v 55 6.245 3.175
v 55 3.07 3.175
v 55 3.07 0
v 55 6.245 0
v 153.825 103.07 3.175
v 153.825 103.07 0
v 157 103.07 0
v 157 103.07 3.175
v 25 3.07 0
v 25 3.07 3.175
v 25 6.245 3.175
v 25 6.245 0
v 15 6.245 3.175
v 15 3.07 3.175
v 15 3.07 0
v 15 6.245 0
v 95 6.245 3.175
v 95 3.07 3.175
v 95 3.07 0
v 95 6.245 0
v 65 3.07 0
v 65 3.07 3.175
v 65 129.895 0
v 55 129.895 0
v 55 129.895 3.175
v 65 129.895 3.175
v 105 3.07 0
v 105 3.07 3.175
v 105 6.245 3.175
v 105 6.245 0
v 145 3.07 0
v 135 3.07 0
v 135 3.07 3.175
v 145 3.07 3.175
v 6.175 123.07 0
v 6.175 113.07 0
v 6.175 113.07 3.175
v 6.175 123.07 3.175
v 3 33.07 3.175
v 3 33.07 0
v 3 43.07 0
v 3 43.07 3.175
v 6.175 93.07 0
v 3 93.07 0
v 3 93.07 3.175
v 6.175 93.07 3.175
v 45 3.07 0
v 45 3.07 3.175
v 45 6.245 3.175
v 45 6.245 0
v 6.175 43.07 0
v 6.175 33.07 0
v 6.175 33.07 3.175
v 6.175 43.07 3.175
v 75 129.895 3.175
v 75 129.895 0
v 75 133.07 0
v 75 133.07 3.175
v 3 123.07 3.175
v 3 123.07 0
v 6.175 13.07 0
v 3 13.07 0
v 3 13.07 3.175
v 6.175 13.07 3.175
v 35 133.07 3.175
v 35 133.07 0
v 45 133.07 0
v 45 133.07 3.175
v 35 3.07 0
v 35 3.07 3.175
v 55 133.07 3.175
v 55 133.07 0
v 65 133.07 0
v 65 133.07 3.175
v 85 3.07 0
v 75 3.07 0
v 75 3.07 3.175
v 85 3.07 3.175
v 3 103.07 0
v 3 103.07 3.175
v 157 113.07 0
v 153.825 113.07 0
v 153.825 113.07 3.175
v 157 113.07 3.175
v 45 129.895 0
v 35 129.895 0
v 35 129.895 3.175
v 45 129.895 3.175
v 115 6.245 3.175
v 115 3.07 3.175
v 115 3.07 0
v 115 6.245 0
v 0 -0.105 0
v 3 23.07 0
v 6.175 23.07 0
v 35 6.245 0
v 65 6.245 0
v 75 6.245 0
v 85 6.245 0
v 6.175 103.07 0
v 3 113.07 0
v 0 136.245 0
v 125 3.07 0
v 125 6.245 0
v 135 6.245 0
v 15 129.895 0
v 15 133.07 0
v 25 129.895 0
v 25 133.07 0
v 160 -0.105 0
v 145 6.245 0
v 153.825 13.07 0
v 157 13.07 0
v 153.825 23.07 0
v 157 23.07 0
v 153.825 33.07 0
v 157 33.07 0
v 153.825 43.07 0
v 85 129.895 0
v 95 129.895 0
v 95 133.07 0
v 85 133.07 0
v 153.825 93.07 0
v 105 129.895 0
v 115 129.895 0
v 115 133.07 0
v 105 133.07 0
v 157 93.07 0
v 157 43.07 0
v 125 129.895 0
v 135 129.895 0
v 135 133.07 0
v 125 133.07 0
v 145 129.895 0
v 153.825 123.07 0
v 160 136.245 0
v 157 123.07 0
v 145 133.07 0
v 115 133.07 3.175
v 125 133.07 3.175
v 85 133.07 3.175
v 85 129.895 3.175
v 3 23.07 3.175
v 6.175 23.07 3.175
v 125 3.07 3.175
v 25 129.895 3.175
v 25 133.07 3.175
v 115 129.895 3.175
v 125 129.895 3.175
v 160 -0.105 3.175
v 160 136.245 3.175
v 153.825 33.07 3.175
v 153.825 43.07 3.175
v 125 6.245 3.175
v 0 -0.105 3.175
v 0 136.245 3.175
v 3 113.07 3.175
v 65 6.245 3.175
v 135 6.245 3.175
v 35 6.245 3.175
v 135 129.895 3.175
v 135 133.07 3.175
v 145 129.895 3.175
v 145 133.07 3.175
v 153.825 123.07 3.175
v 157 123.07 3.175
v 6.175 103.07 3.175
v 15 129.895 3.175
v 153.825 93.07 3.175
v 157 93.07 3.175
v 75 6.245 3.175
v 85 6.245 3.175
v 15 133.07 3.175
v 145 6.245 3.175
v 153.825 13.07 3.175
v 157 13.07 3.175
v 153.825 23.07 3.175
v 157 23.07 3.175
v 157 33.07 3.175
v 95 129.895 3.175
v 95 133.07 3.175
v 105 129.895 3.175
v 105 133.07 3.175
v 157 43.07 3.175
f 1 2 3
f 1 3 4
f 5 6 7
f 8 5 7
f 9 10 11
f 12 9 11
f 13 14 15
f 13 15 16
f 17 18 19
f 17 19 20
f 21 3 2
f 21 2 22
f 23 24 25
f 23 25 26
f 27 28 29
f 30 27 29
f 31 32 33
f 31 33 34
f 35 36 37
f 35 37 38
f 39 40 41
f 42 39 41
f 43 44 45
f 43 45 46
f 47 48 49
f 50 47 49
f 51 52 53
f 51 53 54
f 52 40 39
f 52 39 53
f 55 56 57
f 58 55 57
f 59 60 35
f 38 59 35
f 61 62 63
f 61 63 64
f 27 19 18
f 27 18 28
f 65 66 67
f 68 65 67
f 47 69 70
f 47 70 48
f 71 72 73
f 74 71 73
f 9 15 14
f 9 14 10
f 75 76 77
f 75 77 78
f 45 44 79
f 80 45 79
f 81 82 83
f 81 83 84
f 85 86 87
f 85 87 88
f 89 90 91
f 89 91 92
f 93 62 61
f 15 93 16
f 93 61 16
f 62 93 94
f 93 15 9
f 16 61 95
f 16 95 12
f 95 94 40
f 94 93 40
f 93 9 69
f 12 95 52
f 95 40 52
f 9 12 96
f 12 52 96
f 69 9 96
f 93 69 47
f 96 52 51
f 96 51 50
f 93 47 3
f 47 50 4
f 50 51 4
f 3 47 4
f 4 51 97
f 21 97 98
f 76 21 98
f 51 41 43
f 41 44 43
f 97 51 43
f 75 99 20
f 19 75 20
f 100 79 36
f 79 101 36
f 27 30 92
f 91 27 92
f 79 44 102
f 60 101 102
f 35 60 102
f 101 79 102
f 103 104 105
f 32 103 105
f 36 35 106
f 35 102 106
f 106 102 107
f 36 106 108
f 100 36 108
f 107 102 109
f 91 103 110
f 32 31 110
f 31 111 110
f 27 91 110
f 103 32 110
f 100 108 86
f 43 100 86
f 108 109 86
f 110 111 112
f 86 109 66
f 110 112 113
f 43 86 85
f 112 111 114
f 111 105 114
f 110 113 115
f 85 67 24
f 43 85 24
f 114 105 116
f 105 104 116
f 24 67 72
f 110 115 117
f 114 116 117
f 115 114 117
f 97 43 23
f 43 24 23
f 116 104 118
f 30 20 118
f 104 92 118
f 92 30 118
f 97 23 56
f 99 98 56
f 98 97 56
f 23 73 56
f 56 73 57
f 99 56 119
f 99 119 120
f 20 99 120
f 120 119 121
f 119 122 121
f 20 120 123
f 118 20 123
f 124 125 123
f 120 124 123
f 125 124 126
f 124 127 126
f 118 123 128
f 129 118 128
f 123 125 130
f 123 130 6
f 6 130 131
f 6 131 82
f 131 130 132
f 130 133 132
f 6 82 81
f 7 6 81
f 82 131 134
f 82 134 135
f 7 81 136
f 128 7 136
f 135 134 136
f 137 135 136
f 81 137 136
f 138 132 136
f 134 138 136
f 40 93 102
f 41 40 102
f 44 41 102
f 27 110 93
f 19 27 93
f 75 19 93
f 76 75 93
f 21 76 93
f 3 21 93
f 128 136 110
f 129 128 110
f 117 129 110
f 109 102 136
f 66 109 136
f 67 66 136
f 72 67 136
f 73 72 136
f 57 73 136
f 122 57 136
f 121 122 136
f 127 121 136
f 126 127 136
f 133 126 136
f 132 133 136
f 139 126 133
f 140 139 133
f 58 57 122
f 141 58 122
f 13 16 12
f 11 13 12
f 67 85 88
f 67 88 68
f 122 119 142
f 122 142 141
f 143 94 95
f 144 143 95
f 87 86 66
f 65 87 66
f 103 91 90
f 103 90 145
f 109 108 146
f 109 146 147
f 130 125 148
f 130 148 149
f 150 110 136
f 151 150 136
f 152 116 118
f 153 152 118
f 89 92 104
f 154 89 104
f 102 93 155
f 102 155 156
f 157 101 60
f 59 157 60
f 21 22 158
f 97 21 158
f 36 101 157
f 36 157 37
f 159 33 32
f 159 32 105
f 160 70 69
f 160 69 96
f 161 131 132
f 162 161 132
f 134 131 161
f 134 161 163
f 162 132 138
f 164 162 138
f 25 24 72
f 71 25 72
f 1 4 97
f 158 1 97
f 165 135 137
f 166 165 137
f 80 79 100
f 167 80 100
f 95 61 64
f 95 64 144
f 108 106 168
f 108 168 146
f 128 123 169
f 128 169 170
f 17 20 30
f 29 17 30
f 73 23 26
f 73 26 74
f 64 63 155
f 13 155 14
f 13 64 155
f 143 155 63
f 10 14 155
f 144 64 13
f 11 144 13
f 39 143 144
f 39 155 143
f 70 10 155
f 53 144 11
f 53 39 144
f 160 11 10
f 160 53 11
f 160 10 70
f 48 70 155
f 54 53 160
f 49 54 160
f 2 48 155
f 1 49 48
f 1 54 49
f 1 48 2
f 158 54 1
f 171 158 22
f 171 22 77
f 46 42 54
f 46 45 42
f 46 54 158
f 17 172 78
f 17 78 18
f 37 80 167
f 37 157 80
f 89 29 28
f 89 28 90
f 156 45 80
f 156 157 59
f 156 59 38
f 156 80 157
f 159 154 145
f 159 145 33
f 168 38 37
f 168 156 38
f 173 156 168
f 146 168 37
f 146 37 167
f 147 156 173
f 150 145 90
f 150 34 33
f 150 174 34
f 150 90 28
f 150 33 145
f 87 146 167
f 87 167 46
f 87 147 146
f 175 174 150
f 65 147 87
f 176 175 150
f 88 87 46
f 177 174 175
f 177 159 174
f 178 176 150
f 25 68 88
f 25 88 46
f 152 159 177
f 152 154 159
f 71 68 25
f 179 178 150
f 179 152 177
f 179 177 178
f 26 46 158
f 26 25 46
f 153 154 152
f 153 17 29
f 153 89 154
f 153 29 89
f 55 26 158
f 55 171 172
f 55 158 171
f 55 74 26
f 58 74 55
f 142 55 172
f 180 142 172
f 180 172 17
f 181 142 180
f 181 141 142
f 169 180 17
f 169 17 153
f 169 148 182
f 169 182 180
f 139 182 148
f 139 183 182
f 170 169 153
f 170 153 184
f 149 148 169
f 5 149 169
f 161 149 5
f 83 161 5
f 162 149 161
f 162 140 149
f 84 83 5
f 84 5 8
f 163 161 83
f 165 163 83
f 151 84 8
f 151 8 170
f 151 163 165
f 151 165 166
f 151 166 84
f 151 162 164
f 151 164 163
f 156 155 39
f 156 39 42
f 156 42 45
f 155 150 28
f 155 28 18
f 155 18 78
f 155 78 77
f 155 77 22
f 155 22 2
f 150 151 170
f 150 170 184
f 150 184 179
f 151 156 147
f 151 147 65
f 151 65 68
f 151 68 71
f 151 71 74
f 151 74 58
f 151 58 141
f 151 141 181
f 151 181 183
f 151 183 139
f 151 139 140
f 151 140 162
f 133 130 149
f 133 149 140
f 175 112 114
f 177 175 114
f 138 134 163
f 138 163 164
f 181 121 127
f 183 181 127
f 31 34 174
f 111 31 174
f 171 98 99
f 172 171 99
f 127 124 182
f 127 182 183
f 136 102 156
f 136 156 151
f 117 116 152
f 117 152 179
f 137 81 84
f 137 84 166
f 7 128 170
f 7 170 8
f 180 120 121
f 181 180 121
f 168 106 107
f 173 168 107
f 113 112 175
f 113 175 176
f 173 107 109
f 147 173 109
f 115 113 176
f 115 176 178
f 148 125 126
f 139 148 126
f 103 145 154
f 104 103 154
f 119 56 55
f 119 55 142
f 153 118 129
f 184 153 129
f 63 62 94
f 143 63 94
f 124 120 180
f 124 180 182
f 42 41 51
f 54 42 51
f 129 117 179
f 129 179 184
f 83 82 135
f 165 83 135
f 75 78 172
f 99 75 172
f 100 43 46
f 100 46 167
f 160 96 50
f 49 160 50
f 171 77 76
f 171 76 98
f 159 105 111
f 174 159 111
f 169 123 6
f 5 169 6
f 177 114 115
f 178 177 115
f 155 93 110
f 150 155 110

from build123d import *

# Parameters (mm, degrees)
SKETCH1_W           = 160
SKETCH1_H           = 136.35
SKETCH1_W_2         = 10
SKETCH1_H_2         = 3.175
SKETCH1_W_3         = 3.175
SKETCH1_H_3         = 10
BOSS_EXTRUDE1_DEPTH = 3.175


with BuildPart() as part:
    # Sketch1 → Boss-Extrude1 (new body)
    with BuildSketch(Plane.XY):
        with Locations((80, 68.069958461)):
            Rectangle(SKETCH1_W, SKETCH1_H)
        with Locations((40, 131.482458461)):
            Rectangle(SKETCH1_W_2, SKETCH1_H_2, mode=Mode.SUBTRACT)
        with Locations((20, 131.482458461)):
            Rectangle(SKETCH1_W_2, SKETCH1_H_2, mode=Mode.SUBTRACT)
        with Locations((60, 131.482458461)):
            Rectangle(SKETCH1_W_2, SKETCH1_H_2, mode=Mode.SUBTRACT)
        with Locations((80, 131.482458461)):
            Rectangle(SKETCH1_W_2, SKETCH1_H_2, mode=Mode.SUBTRACT)
        with Locations((100, 131.482458461)):
            Rectangle(SKETCH1_W_2, SKETCH1_H_2, mode=Mode.SUBTRACT)
        with Locations((120, 131.482458461)):
            Rectangle(SKETCH1_W_2, SKETCH1_H_2, mode=Mode.SUBTRACT)
        with Locations((140, 131.482458461)):
            Rectangle(SKETCH1_W_2, SKETCH1_H_2, mode=Mode.SUBTRACT)
        with Locations((140, 4.657458461)):
            Rectangle(SKETCH1_W_2, SKETCH1_H_2, mode=Mode.SUBTRACT)
        with Locations((120, 4.657458461)):
            Rectangle(SKETCH1_W_2, SKETCH1_H_2, mode=Mode.SUBTRACT)
        with Locations((100, 4.657458461)):
            Rectangle(SKETCH1_W_2, SKETCH1_H_2, mode=Mode.SUBTRACT)
        with Locations((80, 4.657458461)):
            Rectangle(SKETCH1_W_2, SKETCH1_H_2, mode=Mode.SUBTRACT)
        with Locations((60, 4.657458461)):
            Rectangle(SKETCH1_W_2, SKETCH1_H_2, mode=Mode.SUBTRACT)
        with Locations((40, 4.657458461)):
            Rectangle(SKETCH1_W_2, SKETCH1_H_2, mode=Mode.SUBTRACT)
        with Locations((20, 4.657458461)):
            Rectangle(SKETCH1_W_2, SKETCH1_H_2, mode=Mode.SUBTRACT)
        with Locations((4.5875, 38.069958461)):
            Rectangle(SKETCH1_W_3, SKETCH1_H_3, mode=Mode.SUBTRACT)
        with Locations((4.5875, 98.069958461)):
            Rectangle(SKETCH1_W_3, SKETCH1_H_3, mode=Mode.SUBTRACT)
        with Locations((4.5875, 118.069958461)):
            Rectangle(SKETCH1_W_3, SKETCH1_H_3, mode=Mode.SUBTRACT)
        with Locations((4.5875, 18.069958461)):
            Rectangle(SKETCH1_W_3, SKETCH1_H_3, mode=Mode.SUBTRACT)
        with Locations((155.4125, 18.069958461)):
            Rectangle(SKETCH1_W_3, SKETCH1_H_3, mode=Mode.SUBTRACT)
        with Locations((155.4125, 38.069958461)):
            Rectangle(SKETCH1_W_3, SKETCH1_H_3, mode=Mode.SUBTRACT)
        with Locations((155.4125, 98.069958461)):
            Rectangle(SKETCH1_W_3, SKETCH1_H_3, mode=Mode.SUBTRACT)
        with Locations((155.4125, 118.069958461)):
            Rectangle(SKETCH1_W_3, SKETCH1_H_3, mode=Mode.SUBTRACT)
    extrude(amount=BOSS_EXTRUDE1_DEPTH)


solid = part.part
